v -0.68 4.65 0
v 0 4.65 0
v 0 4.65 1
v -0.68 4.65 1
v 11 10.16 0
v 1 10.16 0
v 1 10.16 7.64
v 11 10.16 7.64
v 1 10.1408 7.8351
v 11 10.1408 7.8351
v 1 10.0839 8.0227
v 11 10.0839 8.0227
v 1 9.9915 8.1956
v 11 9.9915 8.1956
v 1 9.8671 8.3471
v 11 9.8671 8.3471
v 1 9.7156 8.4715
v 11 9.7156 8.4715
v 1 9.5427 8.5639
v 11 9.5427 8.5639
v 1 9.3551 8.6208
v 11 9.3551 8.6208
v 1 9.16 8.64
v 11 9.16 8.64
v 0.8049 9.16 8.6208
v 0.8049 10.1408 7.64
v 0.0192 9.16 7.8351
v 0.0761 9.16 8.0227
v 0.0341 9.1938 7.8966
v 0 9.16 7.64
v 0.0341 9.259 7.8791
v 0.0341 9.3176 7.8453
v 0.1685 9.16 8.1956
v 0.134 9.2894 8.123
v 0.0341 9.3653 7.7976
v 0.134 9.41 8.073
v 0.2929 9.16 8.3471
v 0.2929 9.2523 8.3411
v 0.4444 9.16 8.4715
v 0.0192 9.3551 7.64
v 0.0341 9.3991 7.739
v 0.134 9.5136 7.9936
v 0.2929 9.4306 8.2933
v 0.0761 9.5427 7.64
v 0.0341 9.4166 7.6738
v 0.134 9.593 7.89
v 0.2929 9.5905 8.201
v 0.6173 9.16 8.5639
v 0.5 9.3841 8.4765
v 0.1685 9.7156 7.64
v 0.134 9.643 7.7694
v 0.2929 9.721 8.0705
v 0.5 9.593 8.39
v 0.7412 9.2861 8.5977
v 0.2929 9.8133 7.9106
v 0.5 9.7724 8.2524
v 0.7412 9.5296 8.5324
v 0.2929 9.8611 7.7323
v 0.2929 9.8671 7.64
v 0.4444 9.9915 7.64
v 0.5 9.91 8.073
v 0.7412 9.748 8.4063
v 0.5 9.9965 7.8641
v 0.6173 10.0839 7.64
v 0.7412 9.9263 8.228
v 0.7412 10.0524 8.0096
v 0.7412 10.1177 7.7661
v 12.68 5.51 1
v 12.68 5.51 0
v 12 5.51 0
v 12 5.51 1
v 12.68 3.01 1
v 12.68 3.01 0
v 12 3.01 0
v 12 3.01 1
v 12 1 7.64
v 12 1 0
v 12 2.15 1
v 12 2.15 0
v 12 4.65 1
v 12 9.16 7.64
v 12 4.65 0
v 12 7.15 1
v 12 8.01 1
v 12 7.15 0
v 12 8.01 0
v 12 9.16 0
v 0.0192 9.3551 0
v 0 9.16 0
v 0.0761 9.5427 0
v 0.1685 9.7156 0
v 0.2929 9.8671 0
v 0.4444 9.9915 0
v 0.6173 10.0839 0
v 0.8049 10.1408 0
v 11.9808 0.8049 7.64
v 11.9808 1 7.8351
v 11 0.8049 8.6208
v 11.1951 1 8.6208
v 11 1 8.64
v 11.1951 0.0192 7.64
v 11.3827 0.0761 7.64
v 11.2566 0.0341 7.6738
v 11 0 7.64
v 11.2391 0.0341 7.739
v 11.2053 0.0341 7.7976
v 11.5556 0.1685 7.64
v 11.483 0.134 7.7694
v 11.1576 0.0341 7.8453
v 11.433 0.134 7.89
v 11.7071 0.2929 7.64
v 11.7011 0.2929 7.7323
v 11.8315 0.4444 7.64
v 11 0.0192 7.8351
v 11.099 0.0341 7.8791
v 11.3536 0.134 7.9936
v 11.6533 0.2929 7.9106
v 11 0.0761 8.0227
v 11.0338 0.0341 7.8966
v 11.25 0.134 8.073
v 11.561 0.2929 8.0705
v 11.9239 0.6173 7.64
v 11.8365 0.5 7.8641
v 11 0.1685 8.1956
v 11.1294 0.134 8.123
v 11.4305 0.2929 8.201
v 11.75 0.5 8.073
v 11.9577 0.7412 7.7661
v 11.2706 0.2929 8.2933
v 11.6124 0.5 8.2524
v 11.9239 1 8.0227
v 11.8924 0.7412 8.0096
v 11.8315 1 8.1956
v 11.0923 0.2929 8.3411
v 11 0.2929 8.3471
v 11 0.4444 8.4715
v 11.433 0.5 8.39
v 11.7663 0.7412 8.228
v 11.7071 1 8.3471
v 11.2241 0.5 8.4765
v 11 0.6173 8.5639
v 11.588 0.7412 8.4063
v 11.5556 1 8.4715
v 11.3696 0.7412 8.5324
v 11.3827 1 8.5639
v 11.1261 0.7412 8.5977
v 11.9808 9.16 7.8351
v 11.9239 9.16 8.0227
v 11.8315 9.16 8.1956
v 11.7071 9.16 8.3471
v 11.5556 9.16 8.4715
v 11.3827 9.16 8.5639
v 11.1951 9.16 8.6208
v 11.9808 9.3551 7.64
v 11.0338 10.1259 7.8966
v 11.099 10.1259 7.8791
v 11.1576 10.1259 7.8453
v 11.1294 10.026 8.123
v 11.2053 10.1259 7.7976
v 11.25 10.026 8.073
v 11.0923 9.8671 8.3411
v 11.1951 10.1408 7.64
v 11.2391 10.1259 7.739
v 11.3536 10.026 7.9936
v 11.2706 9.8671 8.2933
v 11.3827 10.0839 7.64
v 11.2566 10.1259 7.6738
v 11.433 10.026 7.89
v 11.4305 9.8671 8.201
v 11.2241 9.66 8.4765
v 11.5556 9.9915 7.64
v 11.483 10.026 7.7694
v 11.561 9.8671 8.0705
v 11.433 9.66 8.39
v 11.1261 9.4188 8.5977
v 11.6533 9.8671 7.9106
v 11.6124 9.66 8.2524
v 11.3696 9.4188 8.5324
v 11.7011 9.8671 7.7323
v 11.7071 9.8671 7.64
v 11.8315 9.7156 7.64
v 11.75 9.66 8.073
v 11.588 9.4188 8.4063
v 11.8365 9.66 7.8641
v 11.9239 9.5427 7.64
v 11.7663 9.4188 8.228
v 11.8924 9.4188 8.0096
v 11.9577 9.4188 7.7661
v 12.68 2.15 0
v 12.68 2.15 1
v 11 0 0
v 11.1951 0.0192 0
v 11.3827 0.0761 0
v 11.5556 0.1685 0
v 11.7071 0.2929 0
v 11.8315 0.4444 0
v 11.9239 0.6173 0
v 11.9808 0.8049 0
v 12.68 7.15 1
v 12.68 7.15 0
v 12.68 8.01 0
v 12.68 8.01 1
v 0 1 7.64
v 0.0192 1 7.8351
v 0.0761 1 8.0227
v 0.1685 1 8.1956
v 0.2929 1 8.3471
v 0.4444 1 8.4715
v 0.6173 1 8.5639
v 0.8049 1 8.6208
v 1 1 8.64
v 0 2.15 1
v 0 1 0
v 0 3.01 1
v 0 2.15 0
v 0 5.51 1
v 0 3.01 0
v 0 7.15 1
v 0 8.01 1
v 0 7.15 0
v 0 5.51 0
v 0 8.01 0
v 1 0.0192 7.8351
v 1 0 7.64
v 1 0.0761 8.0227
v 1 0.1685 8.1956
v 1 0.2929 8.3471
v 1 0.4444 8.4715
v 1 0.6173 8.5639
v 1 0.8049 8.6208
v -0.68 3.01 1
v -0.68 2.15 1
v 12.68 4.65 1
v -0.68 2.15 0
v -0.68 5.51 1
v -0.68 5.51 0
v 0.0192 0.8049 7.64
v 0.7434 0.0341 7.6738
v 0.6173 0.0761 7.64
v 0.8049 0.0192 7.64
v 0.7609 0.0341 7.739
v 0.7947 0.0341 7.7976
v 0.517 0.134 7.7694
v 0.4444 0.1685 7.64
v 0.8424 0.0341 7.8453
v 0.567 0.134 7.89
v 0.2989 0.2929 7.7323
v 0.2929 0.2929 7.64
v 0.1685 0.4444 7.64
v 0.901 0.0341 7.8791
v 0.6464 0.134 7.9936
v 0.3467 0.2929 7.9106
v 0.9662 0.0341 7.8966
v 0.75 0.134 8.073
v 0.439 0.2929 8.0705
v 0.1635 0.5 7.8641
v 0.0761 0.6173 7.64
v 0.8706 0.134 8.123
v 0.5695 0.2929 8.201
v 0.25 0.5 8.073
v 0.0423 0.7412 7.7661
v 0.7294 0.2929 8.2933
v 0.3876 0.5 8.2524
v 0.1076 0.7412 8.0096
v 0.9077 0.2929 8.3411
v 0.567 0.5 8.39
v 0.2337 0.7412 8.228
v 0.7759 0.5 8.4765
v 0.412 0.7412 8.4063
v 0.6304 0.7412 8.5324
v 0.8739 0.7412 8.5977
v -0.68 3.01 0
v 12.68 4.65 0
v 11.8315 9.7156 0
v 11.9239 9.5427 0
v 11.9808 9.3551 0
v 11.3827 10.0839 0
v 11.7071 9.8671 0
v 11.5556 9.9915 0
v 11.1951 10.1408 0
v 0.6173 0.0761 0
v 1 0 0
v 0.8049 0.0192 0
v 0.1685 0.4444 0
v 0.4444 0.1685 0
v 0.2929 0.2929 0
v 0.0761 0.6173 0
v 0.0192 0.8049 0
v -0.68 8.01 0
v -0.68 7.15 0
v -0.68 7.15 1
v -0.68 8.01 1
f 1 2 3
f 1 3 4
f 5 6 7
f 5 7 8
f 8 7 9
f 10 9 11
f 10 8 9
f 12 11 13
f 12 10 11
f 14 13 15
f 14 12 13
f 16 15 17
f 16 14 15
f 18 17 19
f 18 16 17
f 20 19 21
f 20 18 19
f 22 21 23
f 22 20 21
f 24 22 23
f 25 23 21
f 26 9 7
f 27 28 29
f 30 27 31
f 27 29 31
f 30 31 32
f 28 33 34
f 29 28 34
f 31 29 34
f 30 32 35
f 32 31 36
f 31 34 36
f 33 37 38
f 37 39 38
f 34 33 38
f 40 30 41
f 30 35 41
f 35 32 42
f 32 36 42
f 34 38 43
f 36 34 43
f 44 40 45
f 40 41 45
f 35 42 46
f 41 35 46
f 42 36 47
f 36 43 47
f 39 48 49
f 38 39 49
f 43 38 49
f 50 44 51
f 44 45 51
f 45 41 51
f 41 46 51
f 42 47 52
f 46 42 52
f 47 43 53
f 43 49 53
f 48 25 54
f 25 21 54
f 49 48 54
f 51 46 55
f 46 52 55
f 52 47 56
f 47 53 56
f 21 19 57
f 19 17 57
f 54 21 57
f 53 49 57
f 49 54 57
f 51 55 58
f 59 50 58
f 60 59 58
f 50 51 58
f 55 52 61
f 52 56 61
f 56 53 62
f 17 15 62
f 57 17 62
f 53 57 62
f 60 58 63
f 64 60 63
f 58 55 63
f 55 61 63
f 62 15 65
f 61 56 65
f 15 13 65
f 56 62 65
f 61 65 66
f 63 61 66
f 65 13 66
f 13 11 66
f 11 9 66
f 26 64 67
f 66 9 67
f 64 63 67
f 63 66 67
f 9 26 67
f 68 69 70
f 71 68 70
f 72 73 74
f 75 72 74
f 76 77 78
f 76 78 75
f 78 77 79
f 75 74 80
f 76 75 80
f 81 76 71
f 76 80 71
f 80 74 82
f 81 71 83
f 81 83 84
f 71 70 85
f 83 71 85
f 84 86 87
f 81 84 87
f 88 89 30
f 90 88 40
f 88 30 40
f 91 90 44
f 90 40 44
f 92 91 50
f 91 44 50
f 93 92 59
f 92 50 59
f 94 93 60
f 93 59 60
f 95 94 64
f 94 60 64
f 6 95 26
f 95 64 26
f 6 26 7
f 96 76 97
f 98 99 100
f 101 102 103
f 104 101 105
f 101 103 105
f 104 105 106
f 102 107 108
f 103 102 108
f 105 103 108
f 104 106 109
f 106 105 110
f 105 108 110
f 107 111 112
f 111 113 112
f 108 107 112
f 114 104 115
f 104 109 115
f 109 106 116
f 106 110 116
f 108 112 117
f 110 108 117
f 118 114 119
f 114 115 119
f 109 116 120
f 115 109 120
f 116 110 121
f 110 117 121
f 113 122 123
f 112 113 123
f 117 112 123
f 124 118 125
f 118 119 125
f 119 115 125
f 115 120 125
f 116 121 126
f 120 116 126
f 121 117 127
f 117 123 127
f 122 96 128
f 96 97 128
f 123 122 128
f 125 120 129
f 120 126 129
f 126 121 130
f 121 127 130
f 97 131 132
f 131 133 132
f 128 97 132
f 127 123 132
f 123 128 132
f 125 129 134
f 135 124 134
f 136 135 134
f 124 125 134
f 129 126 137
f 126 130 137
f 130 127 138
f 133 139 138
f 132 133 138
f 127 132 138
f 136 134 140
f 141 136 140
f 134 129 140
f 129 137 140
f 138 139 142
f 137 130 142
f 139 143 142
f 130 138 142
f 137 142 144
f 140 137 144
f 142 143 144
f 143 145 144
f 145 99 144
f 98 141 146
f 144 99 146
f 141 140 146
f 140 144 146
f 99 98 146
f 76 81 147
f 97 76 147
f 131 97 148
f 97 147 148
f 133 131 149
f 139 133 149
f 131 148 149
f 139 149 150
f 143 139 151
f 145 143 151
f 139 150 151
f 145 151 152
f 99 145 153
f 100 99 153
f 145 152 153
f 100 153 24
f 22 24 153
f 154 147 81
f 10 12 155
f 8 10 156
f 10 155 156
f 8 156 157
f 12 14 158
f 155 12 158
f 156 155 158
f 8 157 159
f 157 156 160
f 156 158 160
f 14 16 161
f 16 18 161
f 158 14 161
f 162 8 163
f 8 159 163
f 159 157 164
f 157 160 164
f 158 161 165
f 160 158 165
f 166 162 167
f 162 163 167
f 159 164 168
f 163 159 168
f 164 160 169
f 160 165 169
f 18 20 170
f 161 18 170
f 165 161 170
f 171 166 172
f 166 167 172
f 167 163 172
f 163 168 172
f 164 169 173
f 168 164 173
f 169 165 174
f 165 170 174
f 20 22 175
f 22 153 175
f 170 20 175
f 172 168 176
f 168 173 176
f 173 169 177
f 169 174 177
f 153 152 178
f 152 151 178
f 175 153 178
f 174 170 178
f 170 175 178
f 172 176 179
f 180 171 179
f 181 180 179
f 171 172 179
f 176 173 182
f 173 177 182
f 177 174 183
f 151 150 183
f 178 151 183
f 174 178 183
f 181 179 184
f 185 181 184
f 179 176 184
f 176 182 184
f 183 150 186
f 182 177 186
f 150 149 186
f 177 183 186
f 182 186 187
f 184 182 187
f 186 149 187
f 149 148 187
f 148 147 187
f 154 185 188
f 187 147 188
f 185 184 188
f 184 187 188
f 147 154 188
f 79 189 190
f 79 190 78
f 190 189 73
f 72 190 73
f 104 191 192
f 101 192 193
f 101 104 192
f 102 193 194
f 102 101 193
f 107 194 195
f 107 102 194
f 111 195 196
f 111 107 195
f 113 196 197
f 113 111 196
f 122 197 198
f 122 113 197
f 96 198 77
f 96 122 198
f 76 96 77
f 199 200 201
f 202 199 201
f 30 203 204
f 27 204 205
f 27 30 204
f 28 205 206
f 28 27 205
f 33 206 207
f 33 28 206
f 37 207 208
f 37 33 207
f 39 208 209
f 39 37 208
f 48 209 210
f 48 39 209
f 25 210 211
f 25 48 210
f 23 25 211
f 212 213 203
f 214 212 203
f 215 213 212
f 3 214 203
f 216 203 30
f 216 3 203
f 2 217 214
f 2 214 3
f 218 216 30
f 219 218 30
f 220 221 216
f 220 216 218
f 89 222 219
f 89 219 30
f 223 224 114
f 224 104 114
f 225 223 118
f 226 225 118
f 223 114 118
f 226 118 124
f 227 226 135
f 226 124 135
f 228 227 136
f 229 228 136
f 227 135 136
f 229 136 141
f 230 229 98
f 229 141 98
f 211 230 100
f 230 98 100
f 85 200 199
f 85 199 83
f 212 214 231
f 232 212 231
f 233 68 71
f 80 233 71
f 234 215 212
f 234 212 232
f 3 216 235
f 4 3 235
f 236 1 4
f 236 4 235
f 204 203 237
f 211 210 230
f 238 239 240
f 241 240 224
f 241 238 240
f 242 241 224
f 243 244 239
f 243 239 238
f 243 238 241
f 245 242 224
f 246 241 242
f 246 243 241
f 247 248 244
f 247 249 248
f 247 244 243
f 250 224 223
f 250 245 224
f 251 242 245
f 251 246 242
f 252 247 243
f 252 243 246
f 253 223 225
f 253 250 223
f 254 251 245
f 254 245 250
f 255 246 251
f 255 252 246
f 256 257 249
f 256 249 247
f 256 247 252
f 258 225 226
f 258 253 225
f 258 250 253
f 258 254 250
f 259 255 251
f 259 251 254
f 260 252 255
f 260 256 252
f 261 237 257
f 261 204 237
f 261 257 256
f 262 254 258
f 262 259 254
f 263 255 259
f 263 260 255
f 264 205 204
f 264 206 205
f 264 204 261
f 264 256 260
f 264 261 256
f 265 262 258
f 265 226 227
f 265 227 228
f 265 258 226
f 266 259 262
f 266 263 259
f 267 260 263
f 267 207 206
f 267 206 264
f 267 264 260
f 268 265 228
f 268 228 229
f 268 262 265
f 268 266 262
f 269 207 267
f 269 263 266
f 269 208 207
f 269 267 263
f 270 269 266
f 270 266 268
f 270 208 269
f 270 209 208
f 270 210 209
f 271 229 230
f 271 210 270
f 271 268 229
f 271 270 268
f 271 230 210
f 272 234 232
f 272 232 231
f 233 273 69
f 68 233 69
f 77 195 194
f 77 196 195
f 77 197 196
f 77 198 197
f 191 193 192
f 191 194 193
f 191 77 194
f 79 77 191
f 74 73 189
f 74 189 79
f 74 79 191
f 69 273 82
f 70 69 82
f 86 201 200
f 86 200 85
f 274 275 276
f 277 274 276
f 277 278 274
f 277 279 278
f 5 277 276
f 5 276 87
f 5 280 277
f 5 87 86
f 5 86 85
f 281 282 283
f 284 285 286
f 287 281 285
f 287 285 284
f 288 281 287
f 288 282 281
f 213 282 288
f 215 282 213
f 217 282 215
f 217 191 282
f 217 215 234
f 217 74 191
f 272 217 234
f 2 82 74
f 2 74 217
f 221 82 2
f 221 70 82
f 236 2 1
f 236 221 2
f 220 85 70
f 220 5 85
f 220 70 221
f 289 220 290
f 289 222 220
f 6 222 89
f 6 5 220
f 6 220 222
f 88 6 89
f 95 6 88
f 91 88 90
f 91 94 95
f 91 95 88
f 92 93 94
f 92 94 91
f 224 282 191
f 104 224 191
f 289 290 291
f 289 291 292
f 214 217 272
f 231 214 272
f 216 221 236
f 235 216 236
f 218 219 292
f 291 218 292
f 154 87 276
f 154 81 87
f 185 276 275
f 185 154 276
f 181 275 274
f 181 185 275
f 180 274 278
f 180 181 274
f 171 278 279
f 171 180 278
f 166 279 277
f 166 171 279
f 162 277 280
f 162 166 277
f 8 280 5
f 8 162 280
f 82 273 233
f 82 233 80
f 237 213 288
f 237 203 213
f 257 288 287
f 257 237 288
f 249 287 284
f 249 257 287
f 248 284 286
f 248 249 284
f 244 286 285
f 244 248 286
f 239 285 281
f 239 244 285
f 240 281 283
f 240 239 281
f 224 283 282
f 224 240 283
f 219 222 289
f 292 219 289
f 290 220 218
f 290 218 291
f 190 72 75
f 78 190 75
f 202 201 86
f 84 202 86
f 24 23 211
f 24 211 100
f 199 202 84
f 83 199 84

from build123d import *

# Parameters (mm, degrees)
SKETCH1_W           = 12
SKETCH1_H           = 10.16
BOSS_EXTRUDE1_DEPTH = 8.64
FILLET1_R           = 1
SKETCH2_W           = 3.359416773
SKETCH2_H           = 0.86
BOSS_EXTRUDE2_DEPTH = 1


with BuildPart() as part:
    # Sketch1 → Boss-Extrude1 (new body)
    with BuildSketch(Plane.XY):
        with Locations((6, 5.08)):
            Rectangle(SKETCH1_W, SKETCH1_H)
    extrude(amount=BOSS_EXTRUDE1_DEPTH)

    # Fillet1
    fillet1_edges = [part.edges().sort_by_distance(p)[0] for p in [
        (12, 5.08, 8.64),
        (6, 10.16, 8.64),
        (0, 5.08, 8.64),
        (0, 10.16, 4.32),
        (12, 10.16, 4.32),
        (12, 0, 4.32),
        (0, 0, 4.32),
        (6, 0, 8.64),
    ]]
    fillet(fillet1_edges, radius=FILLET1_R)

    # Sketch2 → Boss-Extrude2 (add)
    with BuildSketch(Plane(origin=(0, 0, 0), x_dir=(-1, 0, 0), z_dir=(0, 0, -1))):
        with Locations((-11.000291613, 7.58)):
            Rectangle(SKETCH2_W, SKETCH2_H)
        with Locations((-11.000291613, 5.08)):
            Rectangle(SKETCH2_W, SKETCH2_H)
        with Locations((-11.000291613, 2.58)):
            Rectangle(SKETCH2_W, SKETCH2_H)
        with Locations((-0.999708387, 7.58)):
            Rectangle(SKETCH2_W, SKETCH2_H)
        with Locations((-0.999708387, 5.08)):
            Rectangle(SKETCH2_W, SKETCH2_H)
        with Locations((-0.999708387, 2.58)):
            Rectangle(SKETCH2_W, SKETCH2_H)
    extrude(amount=-BOSS_EXTRUDE2_DEPTH)


solid = part.part
